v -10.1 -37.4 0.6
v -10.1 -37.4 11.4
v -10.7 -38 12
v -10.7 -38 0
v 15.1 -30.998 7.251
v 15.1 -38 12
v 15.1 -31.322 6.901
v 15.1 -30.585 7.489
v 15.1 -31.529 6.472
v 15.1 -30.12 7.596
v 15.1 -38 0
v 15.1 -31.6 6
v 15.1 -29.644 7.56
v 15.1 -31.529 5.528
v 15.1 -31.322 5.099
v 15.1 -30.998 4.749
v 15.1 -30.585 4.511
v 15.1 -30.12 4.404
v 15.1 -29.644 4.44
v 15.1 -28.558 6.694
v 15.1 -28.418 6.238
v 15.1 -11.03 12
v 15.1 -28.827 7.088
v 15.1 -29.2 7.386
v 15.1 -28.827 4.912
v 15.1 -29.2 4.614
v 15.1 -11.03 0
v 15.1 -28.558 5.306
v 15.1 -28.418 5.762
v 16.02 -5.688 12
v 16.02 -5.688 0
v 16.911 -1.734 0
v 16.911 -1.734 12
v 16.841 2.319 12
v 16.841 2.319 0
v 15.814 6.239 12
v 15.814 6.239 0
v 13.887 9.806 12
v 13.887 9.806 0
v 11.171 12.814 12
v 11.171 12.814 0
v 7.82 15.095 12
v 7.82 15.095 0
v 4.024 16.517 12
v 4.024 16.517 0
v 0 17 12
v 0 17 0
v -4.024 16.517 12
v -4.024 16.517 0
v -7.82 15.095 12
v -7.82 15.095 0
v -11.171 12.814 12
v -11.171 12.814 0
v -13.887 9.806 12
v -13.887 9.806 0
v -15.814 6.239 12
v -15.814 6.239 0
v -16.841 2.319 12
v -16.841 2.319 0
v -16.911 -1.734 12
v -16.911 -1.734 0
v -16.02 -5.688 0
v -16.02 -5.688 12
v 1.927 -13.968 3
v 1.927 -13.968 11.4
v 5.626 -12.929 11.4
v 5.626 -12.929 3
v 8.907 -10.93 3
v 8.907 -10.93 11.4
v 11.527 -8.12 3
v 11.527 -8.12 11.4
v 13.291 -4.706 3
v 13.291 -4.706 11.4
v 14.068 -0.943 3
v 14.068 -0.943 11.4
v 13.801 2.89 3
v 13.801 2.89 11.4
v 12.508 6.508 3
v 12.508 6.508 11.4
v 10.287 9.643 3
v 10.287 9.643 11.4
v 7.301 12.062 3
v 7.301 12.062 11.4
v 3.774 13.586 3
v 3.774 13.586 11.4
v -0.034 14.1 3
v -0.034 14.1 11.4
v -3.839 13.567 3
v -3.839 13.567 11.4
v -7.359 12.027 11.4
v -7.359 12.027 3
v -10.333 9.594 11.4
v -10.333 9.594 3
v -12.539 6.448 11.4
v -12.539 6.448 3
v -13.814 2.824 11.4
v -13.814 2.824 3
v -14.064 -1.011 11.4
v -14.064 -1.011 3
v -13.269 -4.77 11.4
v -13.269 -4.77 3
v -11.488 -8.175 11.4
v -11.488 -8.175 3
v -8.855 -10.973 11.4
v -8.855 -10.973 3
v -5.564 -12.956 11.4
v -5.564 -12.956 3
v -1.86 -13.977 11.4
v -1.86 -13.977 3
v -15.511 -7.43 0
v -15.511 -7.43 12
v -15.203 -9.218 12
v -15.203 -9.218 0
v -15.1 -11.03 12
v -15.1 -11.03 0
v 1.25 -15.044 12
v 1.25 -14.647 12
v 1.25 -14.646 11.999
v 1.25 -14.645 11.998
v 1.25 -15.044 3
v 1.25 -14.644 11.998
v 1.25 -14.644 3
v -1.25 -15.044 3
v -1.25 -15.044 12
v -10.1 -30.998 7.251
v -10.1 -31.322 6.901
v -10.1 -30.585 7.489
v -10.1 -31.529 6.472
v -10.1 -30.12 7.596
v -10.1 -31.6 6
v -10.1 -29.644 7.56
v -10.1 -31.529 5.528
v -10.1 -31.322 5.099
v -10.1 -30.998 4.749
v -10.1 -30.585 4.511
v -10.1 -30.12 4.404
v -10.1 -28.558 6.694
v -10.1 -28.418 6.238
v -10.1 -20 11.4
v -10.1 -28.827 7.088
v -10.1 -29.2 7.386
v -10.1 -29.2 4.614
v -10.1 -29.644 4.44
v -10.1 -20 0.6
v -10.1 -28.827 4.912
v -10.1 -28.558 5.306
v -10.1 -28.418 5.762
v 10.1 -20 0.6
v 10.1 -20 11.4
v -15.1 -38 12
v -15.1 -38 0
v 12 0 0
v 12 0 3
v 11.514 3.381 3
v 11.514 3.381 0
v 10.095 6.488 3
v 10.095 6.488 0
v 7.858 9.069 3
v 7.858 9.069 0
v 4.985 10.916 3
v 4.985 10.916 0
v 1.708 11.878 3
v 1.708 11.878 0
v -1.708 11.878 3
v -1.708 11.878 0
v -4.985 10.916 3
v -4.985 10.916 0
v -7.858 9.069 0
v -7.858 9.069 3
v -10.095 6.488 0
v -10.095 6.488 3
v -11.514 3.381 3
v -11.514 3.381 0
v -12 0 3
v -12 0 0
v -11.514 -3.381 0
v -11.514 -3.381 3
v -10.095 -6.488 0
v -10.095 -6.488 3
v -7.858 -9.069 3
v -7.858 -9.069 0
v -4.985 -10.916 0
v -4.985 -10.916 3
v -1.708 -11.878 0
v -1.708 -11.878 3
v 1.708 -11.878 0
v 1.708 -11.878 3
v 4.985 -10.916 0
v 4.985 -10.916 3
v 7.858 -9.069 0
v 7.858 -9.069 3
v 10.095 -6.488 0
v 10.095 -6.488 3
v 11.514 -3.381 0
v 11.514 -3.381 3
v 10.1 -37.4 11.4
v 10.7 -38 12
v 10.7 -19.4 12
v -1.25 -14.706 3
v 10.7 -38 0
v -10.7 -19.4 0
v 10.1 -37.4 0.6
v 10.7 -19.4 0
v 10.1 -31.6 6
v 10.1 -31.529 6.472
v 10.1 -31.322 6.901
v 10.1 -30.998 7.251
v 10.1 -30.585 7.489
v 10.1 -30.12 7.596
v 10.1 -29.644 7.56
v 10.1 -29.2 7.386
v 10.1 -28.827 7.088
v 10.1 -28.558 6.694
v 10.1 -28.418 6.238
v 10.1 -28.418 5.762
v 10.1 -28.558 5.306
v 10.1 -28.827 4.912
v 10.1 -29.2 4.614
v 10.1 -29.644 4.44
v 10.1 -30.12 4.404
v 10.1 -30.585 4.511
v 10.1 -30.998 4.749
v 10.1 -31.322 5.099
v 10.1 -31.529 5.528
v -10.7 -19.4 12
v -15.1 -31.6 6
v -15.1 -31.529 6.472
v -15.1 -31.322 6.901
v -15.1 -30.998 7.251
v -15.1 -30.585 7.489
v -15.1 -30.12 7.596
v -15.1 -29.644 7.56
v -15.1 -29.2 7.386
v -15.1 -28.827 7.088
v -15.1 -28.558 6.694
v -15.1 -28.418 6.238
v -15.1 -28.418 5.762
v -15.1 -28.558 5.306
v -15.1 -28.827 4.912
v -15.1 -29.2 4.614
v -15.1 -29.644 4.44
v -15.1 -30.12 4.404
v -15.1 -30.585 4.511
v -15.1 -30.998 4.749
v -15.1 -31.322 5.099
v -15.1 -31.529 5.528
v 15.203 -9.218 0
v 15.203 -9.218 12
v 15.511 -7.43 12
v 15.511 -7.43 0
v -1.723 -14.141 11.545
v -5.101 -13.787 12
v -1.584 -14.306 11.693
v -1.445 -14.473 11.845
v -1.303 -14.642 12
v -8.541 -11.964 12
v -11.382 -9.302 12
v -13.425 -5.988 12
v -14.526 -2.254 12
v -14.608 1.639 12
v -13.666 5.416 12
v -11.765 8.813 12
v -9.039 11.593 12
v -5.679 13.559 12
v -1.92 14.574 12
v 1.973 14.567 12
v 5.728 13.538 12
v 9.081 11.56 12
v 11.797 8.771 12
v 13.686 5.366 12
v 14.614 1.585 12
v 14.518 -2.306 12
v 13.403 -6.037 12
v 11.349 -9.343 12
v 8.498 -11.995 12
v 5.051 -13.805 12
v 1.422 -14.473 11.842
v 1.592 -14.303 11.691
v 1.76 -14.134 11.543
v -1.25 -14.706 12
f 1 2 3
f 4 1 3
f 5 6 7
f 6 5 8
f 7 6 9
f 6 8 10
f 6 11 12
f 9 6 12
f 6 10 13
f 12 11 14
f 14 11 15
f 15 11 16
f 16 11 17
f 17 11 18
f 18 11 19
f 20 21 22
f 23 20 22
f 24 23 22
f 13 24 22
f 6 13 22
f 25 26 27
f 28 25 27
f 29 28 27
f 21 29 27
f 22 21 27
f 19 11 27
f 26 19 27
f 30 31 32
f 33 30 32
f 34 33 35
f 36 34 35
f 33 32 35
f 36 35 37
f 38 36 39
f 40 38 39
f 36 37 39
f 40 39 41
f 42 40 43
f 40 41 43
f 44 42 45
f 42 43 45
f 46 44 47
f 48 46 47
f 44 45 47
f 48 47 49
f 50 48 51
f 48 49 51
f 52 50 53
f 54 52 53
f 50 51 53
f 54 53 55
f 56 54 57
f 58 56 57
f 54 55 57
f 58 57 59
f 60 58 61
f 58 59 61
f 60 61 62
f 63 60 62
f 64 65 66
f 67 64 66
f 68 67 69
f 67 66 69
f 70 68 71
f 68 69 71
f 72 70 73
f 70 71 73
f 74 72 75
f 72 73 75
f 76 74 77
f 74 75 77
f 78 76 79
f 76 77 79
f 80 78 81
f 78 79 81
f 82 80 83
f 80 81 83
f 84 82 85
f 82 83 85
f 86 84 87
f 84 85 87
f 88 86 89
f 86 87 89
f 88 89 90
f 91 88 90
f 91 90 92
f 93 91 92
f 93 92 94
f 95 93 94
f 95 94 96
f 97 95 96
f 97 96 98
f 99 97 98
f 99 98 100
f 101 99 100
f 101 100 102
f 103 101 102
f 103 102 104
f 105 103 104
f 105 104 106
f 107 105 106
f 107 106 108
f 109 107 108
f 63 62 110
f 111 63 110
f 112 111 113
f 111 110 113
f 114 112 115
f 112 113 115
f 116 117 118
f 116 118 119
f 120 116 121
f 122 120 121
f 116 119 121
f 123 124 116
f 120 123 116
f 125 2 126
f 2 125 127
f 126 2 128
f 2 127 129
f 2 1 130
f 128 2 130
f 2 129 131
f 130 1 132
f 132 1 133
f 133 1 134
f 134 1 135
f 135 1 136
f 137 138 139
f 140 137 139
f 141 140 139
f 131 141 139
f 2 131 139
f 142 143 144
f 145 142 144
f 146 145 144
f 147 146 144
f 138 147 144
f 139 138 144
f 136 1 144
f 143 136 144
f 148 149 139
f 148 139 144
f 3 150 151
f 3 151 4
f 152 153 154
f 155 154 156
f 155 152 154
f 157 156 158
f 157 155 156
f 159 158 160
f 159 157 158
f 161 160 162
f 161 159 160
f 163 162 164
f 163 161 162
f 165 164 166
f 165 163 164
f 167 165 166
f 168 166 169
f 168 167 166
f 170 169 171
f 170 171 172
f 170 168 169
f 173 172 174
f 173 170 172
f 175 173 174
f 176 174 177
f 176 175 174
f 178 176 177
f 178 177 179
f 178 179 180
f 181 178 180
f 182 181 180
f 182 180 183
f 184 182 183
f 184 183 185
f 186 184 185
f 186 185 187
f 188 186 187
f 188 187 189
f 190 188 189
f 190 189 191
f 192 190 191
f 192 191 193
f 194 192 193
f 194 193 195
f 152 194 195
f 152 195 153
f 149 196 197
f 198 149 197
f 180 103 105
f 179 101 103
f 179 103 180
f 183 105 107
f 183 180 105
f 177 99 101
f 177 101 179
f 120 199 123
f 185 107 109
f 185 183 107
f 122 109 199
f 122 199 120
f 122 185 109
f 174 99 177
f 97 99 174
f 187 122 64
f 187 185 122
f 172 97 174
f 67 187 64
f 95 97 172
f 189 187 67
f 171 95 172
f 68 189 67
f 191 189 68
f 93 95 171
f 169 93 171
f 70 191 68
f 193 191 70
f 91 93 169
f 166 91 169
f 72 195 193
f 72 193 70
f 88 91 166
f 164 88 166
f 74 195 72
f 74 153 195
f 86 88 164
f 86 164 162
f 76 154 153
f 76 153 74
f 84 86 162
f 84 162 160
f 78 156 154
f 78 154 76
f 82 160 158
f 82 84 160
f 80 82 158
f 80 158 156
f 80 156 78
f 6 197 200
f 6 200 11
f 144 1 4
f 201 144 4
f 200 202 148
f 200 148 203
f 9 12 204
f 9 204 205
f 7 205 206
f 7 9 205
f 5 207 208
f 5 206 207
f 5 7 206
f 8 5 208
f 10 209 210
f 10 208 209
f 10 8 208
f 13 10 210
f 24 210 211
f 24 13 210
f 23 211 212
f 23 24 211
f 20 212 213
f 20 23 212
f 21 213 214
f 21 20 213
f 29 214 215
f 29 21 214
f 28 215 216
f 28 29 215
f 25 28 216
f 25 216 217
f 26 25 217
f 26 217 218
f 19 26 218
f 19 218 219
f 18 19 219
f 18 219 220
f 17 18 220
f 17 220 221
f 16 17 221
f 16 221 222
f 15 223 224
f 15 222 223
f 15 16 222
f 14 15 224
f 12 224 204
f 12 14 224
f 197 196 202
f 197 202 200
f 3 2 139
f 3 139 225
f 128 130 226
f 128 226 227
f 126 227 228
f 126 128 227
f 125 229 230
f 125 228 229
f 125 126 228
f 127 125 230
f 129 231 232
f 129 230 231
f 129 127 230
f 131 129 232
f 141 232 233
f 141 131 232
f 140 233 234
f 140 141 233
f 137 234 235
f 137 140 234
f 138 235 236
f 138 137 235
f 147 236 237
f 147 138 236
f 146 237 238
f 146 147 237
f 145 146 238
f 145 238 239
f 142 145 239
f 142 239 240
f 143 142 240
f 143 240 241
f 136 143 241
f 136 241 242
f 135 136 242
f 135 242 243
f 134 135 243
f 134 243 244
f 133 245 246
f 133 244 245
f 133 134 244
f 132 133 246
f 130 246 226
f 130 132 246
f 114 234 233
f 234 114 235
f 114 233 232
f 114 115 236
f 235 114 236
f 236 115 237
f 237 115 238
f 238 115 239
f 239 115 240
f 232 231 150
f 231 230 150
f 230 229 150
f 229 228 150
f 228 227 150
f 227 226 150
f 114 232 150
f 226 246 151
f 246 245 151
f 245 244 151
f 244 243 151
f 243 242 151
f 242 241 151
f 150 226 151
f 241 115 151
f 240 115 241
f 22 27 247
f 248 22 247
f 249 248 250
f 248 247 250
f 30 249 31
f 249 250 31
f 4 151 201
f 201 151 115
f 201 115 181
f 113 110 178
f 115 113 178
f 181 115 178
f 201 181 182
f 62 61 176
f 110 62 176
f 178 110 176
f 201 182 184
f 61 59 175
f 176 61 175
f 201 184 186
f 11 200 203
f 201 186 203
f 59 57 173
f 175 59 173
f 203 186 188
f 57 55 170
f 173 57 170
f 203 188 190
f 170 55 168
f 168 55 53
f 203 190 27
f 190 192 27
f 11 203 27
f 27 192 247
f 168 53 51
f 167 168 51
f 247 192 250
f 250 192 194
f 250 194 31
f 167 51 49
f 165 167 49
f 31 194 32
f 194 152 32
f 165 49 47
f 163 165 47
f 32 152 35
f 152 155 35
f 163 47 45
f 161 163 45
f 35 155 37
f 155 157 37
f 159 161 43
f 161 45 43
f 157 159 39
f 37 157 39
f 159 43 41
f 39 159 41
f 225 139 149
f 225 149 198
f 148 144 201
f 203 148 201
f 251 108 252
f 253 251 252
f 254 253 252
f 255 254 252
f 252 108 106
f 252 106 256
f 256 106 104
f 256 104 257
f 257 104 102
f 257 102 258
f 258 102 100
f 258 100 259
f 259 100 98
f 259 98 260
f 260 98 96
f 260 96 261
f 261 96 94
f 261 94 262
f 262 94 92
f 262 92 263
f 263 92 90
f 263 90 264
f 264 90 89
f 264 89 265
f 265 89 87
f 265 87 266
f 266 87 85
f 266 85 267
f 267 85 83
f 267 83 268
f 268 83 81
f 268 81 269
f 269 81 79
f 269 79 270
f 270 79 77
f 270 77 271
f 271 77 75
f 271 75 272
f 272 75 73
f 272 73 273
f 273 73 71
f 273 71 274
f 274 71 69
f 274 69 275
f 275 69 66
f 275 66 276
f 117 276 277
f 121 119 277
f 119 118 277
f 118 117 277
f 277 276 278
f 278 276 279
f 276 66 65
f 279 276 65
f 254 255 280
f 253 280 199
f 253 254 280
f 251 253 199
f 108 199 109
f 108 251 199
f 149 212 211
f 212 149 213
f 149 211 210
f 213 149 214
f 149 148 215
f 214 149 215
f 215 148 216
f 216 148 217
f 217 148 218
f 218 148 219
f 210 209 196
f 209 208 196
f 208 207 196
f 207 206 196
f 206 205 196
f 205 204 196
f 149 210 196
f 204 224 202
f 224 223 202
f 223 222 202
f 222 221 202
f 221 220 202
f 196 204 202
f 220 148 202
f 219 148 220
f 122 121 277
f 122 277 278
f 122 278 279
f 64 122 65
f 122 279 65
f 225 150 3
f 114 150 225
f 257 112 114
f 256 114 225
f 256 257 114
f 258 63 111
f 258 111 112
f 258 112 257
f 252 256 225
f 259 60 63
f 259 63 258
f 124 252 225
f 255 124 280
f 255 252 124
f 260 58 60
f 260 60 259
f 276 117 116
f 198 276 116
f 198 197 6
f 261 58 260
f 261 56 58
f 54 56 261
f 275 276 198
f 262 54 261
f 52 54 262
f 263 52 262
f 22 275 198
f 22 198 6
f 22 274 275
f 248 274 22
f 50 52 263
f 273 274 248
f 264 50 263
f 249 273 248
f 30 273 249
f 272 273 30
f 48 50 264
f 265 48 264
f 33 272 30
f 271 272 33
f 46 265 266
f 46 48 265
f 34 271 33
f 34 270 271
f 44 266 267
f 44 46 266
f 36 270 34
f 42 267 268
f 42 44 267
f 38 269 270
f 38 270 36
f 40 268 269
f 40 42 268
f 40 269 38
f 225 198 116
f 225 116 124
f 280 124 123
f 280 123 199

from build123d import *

# Parameters (mm, degrees)
SKETCH1_R               = 12
BOSS_EXTRUDE1_DEPTH     = 12
SKETCH9_R               = 14.1
CUT_EXTRUDE2_DEPTH      = 9
SKETCH7_R               = 14
SKETCH7_R_2             = 12
BOSS_EXTRUDE3_DEPTH     = 3
CUT_EXTRUDE5_DEPTH      = 49.191389272
CUT_EXTRUDE5_DEPTH_BACK = 49.191389272
SKETCH12_R              = 1.6
SKETCH13_W              = 2.5
SKETCH13_H              = 1
CUT_EXTRUDE6_DEPTH      = 9
CHAMFER1_SIZE           = 0.6
CHAMFER1_SIZE_2         = 0.661222502


with BuildPart() as part:
    # Sketch1 → Boss-Extrude1 (new body)
    with BuildSketch(Plane.XY):
        with BuildLine():
            Line((-15.1, -38), (-10.1, -38))
            Line((-10.1, -38), (-10.1, -20))
            Line((-10.1, -20), (10.1, -20))
            Line((10.1, -20), (10.1, -38))
            Line((10.1, -38), (15.1, -38))
            Line((15.1, -38), (15.1, -11.029534738))
            ThreePointArc((15.1, -11.029534738), (15.331712472, -8.319532432), (16.020123134, -5.688203124))
            ThreePointArc((16.020123134, -5.688203124), (0, 17), (-16.020123134, -5.688203124))
            ThreePointArc((-16.020123134, -5.688203124), (-15.331712472, -8.319532432), (-15.1, -11.029534738))
            Line((-15.1, -11.029534738), (-15.1, -38))
        make_face()
        Circle(SKETCH1_R, mode=Mode.SUBTRACT)
    extrude(amount=BOSS_EXTRUDE1_DEPTH)

    # Sketch9 → Cut-Extrude2 (cut)
    with BuildSketch(Plane.XY.offset(12)):
        Circle(SKETCH9_R)
    extrude(amount=-CUT_EXTRUDE2_DEPTH, mode=Mode.SUBTRACT)

    # Sketch7 → Boss-Extrude3 (add)
    with BuildSketch(Plane.XY):
        Circle(SKETCH7_R)
        with Locations(Location((0, 0, 0), (0, 0, 180))):
            Circle(SKETCH7_R_2, mode=Mode.SUBTRACT)
    extrude(amount=BOSS_EXTRUDE3_DEPTH)

    # Sketch12 → Cut-Extrude5 (cut, two sides: drawn at the far end of the back side and taken through both)
    with BuildSketch(Plane.ZY.offset(-10.1).offset(-CUT_EXTRUDE5_DEPTH_BACK)):
        with Locations(Location((6, -30, 0), (0, 0, 270))):
            Circle(SKETCH12_R)
    extrude(amount=CUT_EXTRUDE5_DEPTH + CUT_EXTRUDE5_DEPTH_BACK, mode=Mode.SUBTRACT)

    # Sketch13 → Cut-Extrude6 (cut)
    with BuildSketch(Plane.XY.offset(12)):
        with Locations((0, -14.544482903)):
            Rectangle(SKETCH13_W, SKETCH13_H)
    extrude(amount=-CUT_EXTRUDE6_DEPTH, mode=Mode.SUBTRACT)

    # Chamfer1
    # the kernel refuses this chamfer: 0.661222502, 0.6 mm, written as the material it takes off along each edge
    with BuildSketch(Plane(origin=(10.1, -20, 0), x_dir=(0, 0, 1), z_dir=(0, -1, 0)), Plane(origin=(-10.1, -39.543009793, 0), x_dir=(0, 0, 1), z_dir=(0, 1, 0))) as chamfer1_piece_1:
        Polygon((CHAMFER1_SIZE, 0), (0, -CHAMFER1_SIZE), (0, 0), align=None)
    extrude(amount=19.543009793, mode=Mode.SUBTRACT)
    with BuildSketch(Plane(origin=(-10.1, -20, 0), x_dir=(0, 0, 1), z_dir=(1, 0, 0))) as chamfer1_piece_2:
        Polygon((CHAMFER1_SIZE, 0), (0, -CHAMFER1_SIZE), (0, 0), align=None)
    extrude(amount=20.2, mode=Mode.SUBTRACT)
    with BuildSketch(Plane(origin=(-10.1, -39.543009793, 12), x_dir=(0, 0, -1), z_dir=(0, 1, 0)), Plane(origin=(10.1, -20, 12), x_dir=(0, 0, -1), z_dir=(0, -1, 0))) as chamfer1_piece_3:
        Polygon((CHAMFER1_SIZE, 0), (0, CHAMFER1_SIZE), (0, 0), align=None)
    extrude(amount=19.543009793, mode=Mode.SUBTRACT)
    with BuildSketch(Plane(origin=(10.1, -38, -1.543009793), x_dir=(0, 1, 0), z_dir=(0, 0, 1))) as chamfer1_piece_4:
        Polygon((CHAMFER1_SIZE, 0), (0, -CHAMFER1_SIZE), (0, 0), align=None)
    extrude(amount=15.086019586, mode=Mode.SUBTRACT)
    with BuildSketch(Plane(origin=(-10.1, -38, -1.543009793), x_dir=(0, 1, 0), z_dir=(0, 0, 1))) as chamfer1_piece_5:
        Polygon((CHAMFER1_SIZE, 0), (0, CHAMFER1_SIZE), (0, 0), align=None)
    extrude(amount=15.086019586, mode=Mode.SUBTRACT)
    with BuildSketch(Plane(origin=(-10.1, -20, 12), x_dir=(0, 0, -1), z_dir=(1, 0, 0))) as chamfer1_piece_6:
        Polygon((CHAMFER1_SIZE, 0), (0, CHAMFER1_SIZE), (0, 0), align=None)
    extrude(amount=20.2, mode=Mode.SUBTRACT)
    with BuildSketch(Plane(origin=(-1.25, -14.044482903, 13.704300801), x_dir=(0, -1, 0), z_dir=(0, 0, -1))) as chamfer1_piece_7:
        with BuildLine():
            Line((CHAMFER1_SIZE_2, 0), (-0.06766867, 0.609748345))
            ThreePointArc((-0.06766867, 0.609748345), (-0.031575454, 0.314744335), (0, 0))
            Line((0, 0), (CHAMFER1_SIZE_2, 0))
        make_face()
    extrude(amount=10.704300801, mode=Mode.SUBTRACT)
    with BuildSketch(Plane(origin=(1.25, -14.044482903, 13.754921918), x_dir=(0, -1, 0), z_dir=(0, 0, -1))) as chamfer1_piece_8:
        with BuildLine():
            Line((CHAMFER1_SIZE, 0), (-0.07674701, -0.67674701))
            ThreePointArc((-0.07674701, -0.67674701), (-0.035457258, -0.349124916), (0, 0))
            Line((0, 0), (CHAMFER1_SIZE, 0))
        make_face()
    extrude(amount=10.754921918, mode=Mode.SUBTRACT)
    with BuildSketch(Plane(origin=(-10.1, -20, 0), x_dir=(0, 0, 1), z_dir=(1, 0, 0))) as chamfer1_piece_9a_section:
        Polygon((CHAMFER1_SIZE, 0), (0, -CHAMFER1_SIZE), (0, 0), align=None)
    chamfer1_piece_9a = extrude(amount=21.743009793, mode=Mode.PRIVATE)
    chamfer1_piece_9a = split(chamfer1_piece_9a, bisect_by=Plane(origin=(10.1, -20, 0), z_dir=(1, 0, 0)), keep=Keep.TOP, mode=Mode.PRIVATE)
    with BuildSketch(Plane(origin=(10.1, -18.456990207, 0), x_dir=(0, 0, 1), z_dir=(0, -1, 0))) as chamfer1_piece_9b_section:
        Polygon((CHAMFER1_SIZE, 0), (0, -CHAMFER1_SIZE), (0, 0), align=None)
    chamfer1_piece_9b = extrude(amount=19.543009793, mode=Mode.PRIVATE)
    chamfer1_piece_9b = split(chamfer1_piece_9b, bisect_by=Plane(origin=(10.1, -20, 0), z_dir=(0, 1, 0)), keep=Keep.TOP, mode=Mode.PRIVATE)
    chamfer1_piece_9 = chamfer1_piece_9a & chamfer1_piece_9b
    add(chamfer1_piece_9, mode=Mode.SUBTRACT)
    with BuildSketch(Plane(origin=(-10.1, -38, 0), x_dir=(0, 0, 1), z_dir=(0, 1, 0))) as chamfer1_piece_10a_section:
        Polygon((CHAMFER1_SIZE, 0), (0, -CHAMFER1_SIZE), (0, 0), align=None)
    chamfer1_piece_10a = extrude(amount=19.543009793, mode=Mode.PRIVATE)
    chamfer1_piece_10a = split(chamfer1_piece_10a, bisect_by=Plane(origin=(-10.1, -20, 0), z_dir=(0, 1, 0)), keep=Keep.TOP, mode=Mode.PRIVATE)
    with BuildSketch(Plane(origin=(-11.643009793, -20, 0), x_dir=(0, 0, 1), z_dir=(1, 0, 0))) as chamfer1_piece_10b_section:
        Polygon((CHAMFER1_SIZE, 0), (0, -CHAMFER1_SIZE), (0, 0), align=None)
    chamfer1_piece_10b = extrude(amount=21.743009793, mode=Mode.PRIVATE)
    chamfer1_piece_10b = split(chamfer1_piece_10b, bisect_by=Plane(origin=(-10.1, -20, 0), z_dir=(-1, 0, 0)), keep=Keep.TOP, mode=Mode.PRIVATE)
    chamfer1_piece_10 = chamfer1_piece_10a & chamfer1_piece_10b
    add(chamfer1_piece_10, mode=Mode.SUBTRACT)
    with BuildSketch(Plane(origin=(-10.1, -38, 12), x_dir=(0, 0, -1), z_dir=(0, 1, 0))) as chamfer1_piece_11a_section:
        Polygon((CHAMFER1_SIZE, 0), (0, CHAMFER1_SIZE), (0, 0), align=None)
    chamfer1_piece_11a = extrude(amount=19.543009793, mode=Mode.PRIVATE)
    chamfer1_piece_11a = split(chamfer1_piece_11a, bisect_by=Plane(origin=(-10.1, -20, 12), z_dir=(0, 1, 0)), keep=Keep.TOP, mode=Mode.PRIVATE)
    with BuildSketch(Plane(origin=(-11.643009793, -20, 12), x_dir=(0, 0, -1), z_dir=(1, 0, 0))) as chamfer1_piece_11b_section:
        Polygon((CHAMFER1_SIZE, 0), (0, CHAMFER1_SIZE), (0, 0), align=None)
    chamfer1_piece_11b = extrude(amount=21.743009793, mode=Mode.PRIVATE)
    chamfer1_piece_11b = split(chamfer1_piece_11b, bisect_by=Plane(origin=(-10.1, -20, 12), z_dir=(-1, 0, 0)), keep=Keep.TOP, mode=Mode.PRIVATE)
    chamfer1_piece_11 = chamfer1_piece_11a & chamfer1_piece_11b
    add(chamfer1_piece_11, mode=Mode.SUBTRACT)
    with BuildSketch(Plane(origin=(-10.1, -20, 12), x_dir=(0, 0, -1), z_dir=(1, 0, 0))) as chamfer1_piece_12a_section:
        Polygon((CHAMFER1_SIZE, 0), (0, CHAMFER1_SIZE), (0, 0), align=None)
    chamfer1_piece_12a = extrude(amount=21.743009793, mode=Mode.PRIVATE)
    chamfer1_piece_12a = split(chamfer1_piece_12a, bisect_by=Plane(origin=(10.1, -20, 12), z_dir=(1, 0, 0)), keep=Keep.TOP, mode=Mode.PRIVATE)
    with BuildSketch(Plane(origin=(10.1, -18.456990207, 12), x_dir=(0, 0, -1), z_dir=(0, -1, 0))) as chamfer1_piece_12b_section:
        Polygon((CHAMFER1_SIZE, 0), (0, CHAMFER1_SIZE), (0, 0), align=None)
    chamfer1_piece_12b = extrude(amount=19.543009793, mode=Mode.PRIVATE)
    chamfer1_piece_12b = split(chamfer1_piece_12b, bisect_by=Plane(origin=(10.1, -20, 12), z_dir=(0, 1, 0)), keep=Keep.TOP, mode=Mode.PRIVATE)
    chamfer1_piece_12 = chamfer1_piece_12a & chamfer1_piece_12b
    add(chamfer1_piece_12, mode=Mode.SUBTRACT)
    # the kernel refuses this chamfer: 0.661222502, 0.6 mm, written as the material it takes off along each edge
    with BuildSketch(Plane(origin=(0, 0, 12), x_dir=(-0.02220052669057942, -0.9997535379355558, 0), z_dir=(0.9997535379355558, -0.02220052669057942, 0))) as chamfer1_2_piece_1:
        Polygon((14.1 + CHAMFER1_SIZE, 0), (14.1, CHAMFER1_SIZE), (14.1, 0), align=None)
    revolve(axis=Axis((0, 0, 12), (0, 0, -1)), revolution_arc=357.181058693, mode=Mode.SUBTRACT)


solid = part.part
